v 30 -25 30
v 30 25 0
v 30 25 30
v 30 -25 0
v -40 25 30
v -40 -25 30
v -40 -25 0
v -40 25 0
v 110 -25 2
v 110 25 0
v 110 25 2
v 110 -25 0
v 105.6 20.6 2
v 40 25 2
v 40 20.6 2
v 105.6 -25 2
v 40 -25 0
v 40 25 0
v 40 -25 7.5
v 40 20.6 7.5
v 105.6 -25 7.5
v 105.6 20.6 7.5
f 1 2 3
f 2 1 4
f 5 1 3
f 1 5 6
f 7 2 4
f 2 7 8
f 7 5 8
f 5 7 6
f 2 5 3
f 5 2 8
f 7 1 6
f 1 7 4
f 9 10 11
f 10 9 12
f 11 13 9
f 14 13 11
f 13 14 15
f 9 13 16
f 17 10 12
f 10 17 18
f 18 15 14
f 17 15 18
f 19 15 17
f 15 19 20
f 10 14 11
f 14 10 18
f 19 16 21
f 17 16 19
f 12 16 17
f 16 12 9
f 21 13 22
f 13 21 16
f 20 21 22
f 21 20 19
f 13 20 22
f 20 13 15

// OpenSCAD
// Two-part enclosure for electronics board.
// Part 1: Box (left) - 70x50x30mm outer, 2mm walls, 2mm floor, open top.
// Part 2: Lid (right) - Printed upside down, plate with lip sliding into box.
// Parts are placed side-by-side with a 10mm gap.

// Dimensions
box_X  = 70;
box_Y  = 50;
box_Z  = 30;
wall   = 2;
floor  = 2;

// Lid dimensions
lid_plate_X = 70;
lid_plate_Y = 50;
lid_plate_Z = 2;
lip_wall    = 1.5;
lip_height  = 4;
lip_outer_X = 65.6;
lip_outer_Y = 45.6;

// Gap between parts
gap = 10;

// Derived dimensions for the box inner cavity
box_inner_X = box_X - 2 * wall;
box_inner_Y = box_Y - 2 * wall;
box_inner_Z = box_Z - floor;

// Derived dimensions for the lid lip clearance
// Lip outer size is 65.6 x 45.6. Box inner is 66 x 46.
// Clearance = (Box Inner - Lip Outer) / 2 = (66 - 65.6)/2 = 0.2 mm.
// We model the lip as a solid block that sits on the plate.
// The lip block outer size is 65.6 x 45.6 x (lip_height + lip_wall).
// The lip block thickness (Z) is 1.5 + 4 = 5.5 mm.
// The plate is 2 mm thick. Total lid height = 7.5 mm.
// The lip sits on top of the plate.
// To slide into the box, the lip's outer face must be smaller than the box's inner face.
// Lip outer X = 65.6. Box inner X = 66. Diff = 0.4. Half diff = 0.2.
// Lip outer Y = 45.6. Box inner Y = 46. Diff = 0.4. Half diff = 0.2.

$fn = 64;

// --- Part 1: The Box ---
// Position: Centered in Y, starts at X = -gap/2 - box_X/2.
// Actually, let's center the whole assembly at X=0.
// Box center X = - (gap + box_X + lid_plate_X) / 2 + box_X/2
// Simpler: Box starts at X = - (gap + box_X) / 2.
// Lid starts at X = - (gap + box_X) / 2 + box_X + gap.

box_start_X = - (gap + box_X) / 2;
lid_start_X = box_start_X + box_X + gap;

// Box Module
module box() {
    // Main block with hole for top
    // We build a solid block and subtract the top opening.
    // Block size: box_X x box_Y x box_Z
    // Opening: (box_X - 2*wall) x (box_Y - 2*wall) x (box_Z - floor)
    
    translate([box_start_X, -box_Y/2, 0]) {
        // Base block
        cube([box_X, box_Y, box_Z]);
        
        // Cut out the top opening
        // The opening is a hole from floor+1 to top.
        // Hole size: inner_X x inner_Y x (box_Z - floor)
        // Position: centered in X and Y.
        // Z start: floor. Z end: box_Z.
        translate([0, 0, floor]) {
            cube([box_inner_X, box_inner_Y, box_Z - floor]);
        }
    }
}

// Lid Module
// The lid is printed upside down relative to the box opening?
// "Part 2, the lid, printed upside down: a plate ... lying on the bed"
// This implies the plate face is on the bed (Z=0). The lip is on top of the plate (positive Z).
// The lip slides into the box.
// So the lip's bottom face is at Z = lid_plate_Z.
// The lip's top face is at Z = lid_plate_Z + lip_height + lip_wall.
// The box opening is at Z = floor to box_Z.
// We need the lip to fit inside.
// Lip bottom Z = 2. Lip top Z = 2 + 4 + 1.5 = 7.5.
// Box opening Z range = 2 to 30.
// So the lip fits vertically.

module lid() {
    translate([lid_start_X, -lid_plate_Y/2, 0]) {
        // 1. The base plate
        cube([lid_plate_X, lid_plate_Y, lid_plate_Z]);
        
        // 2. The lip
        // The lip is a rectangular block sitting on the plate.
        // Outer dimensions: lip_outer_X x lip_outer_Y
        // Height: lip_height + lip_wall
        // It is centered on the plate.
        // We model it as a solid block.
        // Thickness in Z: lip_height + lip_wall = 5.5
        // Position Z: starts at lid_plate_Z (2)
        
        translate([0, 0, lid_plate_Z]) {
            cube([lip_outer_X, lip_outer_Y, lip_height + lip_wall]);
        }
    }
}

// --- Assembly ---
// We use a union to print them together.
// Since they are separate modules, we just call them.
// However, to ensure they don't merge into a single mesh that might cause issues with supports or slicing if they touch,
// we rely on the gap. The gap is 10mm, so they are far apart.

difference() {
    // We don't need a difference here unless we want to hide supports.
    // Just union the parts.
    union() {
        box();
        lid();
    }
}
